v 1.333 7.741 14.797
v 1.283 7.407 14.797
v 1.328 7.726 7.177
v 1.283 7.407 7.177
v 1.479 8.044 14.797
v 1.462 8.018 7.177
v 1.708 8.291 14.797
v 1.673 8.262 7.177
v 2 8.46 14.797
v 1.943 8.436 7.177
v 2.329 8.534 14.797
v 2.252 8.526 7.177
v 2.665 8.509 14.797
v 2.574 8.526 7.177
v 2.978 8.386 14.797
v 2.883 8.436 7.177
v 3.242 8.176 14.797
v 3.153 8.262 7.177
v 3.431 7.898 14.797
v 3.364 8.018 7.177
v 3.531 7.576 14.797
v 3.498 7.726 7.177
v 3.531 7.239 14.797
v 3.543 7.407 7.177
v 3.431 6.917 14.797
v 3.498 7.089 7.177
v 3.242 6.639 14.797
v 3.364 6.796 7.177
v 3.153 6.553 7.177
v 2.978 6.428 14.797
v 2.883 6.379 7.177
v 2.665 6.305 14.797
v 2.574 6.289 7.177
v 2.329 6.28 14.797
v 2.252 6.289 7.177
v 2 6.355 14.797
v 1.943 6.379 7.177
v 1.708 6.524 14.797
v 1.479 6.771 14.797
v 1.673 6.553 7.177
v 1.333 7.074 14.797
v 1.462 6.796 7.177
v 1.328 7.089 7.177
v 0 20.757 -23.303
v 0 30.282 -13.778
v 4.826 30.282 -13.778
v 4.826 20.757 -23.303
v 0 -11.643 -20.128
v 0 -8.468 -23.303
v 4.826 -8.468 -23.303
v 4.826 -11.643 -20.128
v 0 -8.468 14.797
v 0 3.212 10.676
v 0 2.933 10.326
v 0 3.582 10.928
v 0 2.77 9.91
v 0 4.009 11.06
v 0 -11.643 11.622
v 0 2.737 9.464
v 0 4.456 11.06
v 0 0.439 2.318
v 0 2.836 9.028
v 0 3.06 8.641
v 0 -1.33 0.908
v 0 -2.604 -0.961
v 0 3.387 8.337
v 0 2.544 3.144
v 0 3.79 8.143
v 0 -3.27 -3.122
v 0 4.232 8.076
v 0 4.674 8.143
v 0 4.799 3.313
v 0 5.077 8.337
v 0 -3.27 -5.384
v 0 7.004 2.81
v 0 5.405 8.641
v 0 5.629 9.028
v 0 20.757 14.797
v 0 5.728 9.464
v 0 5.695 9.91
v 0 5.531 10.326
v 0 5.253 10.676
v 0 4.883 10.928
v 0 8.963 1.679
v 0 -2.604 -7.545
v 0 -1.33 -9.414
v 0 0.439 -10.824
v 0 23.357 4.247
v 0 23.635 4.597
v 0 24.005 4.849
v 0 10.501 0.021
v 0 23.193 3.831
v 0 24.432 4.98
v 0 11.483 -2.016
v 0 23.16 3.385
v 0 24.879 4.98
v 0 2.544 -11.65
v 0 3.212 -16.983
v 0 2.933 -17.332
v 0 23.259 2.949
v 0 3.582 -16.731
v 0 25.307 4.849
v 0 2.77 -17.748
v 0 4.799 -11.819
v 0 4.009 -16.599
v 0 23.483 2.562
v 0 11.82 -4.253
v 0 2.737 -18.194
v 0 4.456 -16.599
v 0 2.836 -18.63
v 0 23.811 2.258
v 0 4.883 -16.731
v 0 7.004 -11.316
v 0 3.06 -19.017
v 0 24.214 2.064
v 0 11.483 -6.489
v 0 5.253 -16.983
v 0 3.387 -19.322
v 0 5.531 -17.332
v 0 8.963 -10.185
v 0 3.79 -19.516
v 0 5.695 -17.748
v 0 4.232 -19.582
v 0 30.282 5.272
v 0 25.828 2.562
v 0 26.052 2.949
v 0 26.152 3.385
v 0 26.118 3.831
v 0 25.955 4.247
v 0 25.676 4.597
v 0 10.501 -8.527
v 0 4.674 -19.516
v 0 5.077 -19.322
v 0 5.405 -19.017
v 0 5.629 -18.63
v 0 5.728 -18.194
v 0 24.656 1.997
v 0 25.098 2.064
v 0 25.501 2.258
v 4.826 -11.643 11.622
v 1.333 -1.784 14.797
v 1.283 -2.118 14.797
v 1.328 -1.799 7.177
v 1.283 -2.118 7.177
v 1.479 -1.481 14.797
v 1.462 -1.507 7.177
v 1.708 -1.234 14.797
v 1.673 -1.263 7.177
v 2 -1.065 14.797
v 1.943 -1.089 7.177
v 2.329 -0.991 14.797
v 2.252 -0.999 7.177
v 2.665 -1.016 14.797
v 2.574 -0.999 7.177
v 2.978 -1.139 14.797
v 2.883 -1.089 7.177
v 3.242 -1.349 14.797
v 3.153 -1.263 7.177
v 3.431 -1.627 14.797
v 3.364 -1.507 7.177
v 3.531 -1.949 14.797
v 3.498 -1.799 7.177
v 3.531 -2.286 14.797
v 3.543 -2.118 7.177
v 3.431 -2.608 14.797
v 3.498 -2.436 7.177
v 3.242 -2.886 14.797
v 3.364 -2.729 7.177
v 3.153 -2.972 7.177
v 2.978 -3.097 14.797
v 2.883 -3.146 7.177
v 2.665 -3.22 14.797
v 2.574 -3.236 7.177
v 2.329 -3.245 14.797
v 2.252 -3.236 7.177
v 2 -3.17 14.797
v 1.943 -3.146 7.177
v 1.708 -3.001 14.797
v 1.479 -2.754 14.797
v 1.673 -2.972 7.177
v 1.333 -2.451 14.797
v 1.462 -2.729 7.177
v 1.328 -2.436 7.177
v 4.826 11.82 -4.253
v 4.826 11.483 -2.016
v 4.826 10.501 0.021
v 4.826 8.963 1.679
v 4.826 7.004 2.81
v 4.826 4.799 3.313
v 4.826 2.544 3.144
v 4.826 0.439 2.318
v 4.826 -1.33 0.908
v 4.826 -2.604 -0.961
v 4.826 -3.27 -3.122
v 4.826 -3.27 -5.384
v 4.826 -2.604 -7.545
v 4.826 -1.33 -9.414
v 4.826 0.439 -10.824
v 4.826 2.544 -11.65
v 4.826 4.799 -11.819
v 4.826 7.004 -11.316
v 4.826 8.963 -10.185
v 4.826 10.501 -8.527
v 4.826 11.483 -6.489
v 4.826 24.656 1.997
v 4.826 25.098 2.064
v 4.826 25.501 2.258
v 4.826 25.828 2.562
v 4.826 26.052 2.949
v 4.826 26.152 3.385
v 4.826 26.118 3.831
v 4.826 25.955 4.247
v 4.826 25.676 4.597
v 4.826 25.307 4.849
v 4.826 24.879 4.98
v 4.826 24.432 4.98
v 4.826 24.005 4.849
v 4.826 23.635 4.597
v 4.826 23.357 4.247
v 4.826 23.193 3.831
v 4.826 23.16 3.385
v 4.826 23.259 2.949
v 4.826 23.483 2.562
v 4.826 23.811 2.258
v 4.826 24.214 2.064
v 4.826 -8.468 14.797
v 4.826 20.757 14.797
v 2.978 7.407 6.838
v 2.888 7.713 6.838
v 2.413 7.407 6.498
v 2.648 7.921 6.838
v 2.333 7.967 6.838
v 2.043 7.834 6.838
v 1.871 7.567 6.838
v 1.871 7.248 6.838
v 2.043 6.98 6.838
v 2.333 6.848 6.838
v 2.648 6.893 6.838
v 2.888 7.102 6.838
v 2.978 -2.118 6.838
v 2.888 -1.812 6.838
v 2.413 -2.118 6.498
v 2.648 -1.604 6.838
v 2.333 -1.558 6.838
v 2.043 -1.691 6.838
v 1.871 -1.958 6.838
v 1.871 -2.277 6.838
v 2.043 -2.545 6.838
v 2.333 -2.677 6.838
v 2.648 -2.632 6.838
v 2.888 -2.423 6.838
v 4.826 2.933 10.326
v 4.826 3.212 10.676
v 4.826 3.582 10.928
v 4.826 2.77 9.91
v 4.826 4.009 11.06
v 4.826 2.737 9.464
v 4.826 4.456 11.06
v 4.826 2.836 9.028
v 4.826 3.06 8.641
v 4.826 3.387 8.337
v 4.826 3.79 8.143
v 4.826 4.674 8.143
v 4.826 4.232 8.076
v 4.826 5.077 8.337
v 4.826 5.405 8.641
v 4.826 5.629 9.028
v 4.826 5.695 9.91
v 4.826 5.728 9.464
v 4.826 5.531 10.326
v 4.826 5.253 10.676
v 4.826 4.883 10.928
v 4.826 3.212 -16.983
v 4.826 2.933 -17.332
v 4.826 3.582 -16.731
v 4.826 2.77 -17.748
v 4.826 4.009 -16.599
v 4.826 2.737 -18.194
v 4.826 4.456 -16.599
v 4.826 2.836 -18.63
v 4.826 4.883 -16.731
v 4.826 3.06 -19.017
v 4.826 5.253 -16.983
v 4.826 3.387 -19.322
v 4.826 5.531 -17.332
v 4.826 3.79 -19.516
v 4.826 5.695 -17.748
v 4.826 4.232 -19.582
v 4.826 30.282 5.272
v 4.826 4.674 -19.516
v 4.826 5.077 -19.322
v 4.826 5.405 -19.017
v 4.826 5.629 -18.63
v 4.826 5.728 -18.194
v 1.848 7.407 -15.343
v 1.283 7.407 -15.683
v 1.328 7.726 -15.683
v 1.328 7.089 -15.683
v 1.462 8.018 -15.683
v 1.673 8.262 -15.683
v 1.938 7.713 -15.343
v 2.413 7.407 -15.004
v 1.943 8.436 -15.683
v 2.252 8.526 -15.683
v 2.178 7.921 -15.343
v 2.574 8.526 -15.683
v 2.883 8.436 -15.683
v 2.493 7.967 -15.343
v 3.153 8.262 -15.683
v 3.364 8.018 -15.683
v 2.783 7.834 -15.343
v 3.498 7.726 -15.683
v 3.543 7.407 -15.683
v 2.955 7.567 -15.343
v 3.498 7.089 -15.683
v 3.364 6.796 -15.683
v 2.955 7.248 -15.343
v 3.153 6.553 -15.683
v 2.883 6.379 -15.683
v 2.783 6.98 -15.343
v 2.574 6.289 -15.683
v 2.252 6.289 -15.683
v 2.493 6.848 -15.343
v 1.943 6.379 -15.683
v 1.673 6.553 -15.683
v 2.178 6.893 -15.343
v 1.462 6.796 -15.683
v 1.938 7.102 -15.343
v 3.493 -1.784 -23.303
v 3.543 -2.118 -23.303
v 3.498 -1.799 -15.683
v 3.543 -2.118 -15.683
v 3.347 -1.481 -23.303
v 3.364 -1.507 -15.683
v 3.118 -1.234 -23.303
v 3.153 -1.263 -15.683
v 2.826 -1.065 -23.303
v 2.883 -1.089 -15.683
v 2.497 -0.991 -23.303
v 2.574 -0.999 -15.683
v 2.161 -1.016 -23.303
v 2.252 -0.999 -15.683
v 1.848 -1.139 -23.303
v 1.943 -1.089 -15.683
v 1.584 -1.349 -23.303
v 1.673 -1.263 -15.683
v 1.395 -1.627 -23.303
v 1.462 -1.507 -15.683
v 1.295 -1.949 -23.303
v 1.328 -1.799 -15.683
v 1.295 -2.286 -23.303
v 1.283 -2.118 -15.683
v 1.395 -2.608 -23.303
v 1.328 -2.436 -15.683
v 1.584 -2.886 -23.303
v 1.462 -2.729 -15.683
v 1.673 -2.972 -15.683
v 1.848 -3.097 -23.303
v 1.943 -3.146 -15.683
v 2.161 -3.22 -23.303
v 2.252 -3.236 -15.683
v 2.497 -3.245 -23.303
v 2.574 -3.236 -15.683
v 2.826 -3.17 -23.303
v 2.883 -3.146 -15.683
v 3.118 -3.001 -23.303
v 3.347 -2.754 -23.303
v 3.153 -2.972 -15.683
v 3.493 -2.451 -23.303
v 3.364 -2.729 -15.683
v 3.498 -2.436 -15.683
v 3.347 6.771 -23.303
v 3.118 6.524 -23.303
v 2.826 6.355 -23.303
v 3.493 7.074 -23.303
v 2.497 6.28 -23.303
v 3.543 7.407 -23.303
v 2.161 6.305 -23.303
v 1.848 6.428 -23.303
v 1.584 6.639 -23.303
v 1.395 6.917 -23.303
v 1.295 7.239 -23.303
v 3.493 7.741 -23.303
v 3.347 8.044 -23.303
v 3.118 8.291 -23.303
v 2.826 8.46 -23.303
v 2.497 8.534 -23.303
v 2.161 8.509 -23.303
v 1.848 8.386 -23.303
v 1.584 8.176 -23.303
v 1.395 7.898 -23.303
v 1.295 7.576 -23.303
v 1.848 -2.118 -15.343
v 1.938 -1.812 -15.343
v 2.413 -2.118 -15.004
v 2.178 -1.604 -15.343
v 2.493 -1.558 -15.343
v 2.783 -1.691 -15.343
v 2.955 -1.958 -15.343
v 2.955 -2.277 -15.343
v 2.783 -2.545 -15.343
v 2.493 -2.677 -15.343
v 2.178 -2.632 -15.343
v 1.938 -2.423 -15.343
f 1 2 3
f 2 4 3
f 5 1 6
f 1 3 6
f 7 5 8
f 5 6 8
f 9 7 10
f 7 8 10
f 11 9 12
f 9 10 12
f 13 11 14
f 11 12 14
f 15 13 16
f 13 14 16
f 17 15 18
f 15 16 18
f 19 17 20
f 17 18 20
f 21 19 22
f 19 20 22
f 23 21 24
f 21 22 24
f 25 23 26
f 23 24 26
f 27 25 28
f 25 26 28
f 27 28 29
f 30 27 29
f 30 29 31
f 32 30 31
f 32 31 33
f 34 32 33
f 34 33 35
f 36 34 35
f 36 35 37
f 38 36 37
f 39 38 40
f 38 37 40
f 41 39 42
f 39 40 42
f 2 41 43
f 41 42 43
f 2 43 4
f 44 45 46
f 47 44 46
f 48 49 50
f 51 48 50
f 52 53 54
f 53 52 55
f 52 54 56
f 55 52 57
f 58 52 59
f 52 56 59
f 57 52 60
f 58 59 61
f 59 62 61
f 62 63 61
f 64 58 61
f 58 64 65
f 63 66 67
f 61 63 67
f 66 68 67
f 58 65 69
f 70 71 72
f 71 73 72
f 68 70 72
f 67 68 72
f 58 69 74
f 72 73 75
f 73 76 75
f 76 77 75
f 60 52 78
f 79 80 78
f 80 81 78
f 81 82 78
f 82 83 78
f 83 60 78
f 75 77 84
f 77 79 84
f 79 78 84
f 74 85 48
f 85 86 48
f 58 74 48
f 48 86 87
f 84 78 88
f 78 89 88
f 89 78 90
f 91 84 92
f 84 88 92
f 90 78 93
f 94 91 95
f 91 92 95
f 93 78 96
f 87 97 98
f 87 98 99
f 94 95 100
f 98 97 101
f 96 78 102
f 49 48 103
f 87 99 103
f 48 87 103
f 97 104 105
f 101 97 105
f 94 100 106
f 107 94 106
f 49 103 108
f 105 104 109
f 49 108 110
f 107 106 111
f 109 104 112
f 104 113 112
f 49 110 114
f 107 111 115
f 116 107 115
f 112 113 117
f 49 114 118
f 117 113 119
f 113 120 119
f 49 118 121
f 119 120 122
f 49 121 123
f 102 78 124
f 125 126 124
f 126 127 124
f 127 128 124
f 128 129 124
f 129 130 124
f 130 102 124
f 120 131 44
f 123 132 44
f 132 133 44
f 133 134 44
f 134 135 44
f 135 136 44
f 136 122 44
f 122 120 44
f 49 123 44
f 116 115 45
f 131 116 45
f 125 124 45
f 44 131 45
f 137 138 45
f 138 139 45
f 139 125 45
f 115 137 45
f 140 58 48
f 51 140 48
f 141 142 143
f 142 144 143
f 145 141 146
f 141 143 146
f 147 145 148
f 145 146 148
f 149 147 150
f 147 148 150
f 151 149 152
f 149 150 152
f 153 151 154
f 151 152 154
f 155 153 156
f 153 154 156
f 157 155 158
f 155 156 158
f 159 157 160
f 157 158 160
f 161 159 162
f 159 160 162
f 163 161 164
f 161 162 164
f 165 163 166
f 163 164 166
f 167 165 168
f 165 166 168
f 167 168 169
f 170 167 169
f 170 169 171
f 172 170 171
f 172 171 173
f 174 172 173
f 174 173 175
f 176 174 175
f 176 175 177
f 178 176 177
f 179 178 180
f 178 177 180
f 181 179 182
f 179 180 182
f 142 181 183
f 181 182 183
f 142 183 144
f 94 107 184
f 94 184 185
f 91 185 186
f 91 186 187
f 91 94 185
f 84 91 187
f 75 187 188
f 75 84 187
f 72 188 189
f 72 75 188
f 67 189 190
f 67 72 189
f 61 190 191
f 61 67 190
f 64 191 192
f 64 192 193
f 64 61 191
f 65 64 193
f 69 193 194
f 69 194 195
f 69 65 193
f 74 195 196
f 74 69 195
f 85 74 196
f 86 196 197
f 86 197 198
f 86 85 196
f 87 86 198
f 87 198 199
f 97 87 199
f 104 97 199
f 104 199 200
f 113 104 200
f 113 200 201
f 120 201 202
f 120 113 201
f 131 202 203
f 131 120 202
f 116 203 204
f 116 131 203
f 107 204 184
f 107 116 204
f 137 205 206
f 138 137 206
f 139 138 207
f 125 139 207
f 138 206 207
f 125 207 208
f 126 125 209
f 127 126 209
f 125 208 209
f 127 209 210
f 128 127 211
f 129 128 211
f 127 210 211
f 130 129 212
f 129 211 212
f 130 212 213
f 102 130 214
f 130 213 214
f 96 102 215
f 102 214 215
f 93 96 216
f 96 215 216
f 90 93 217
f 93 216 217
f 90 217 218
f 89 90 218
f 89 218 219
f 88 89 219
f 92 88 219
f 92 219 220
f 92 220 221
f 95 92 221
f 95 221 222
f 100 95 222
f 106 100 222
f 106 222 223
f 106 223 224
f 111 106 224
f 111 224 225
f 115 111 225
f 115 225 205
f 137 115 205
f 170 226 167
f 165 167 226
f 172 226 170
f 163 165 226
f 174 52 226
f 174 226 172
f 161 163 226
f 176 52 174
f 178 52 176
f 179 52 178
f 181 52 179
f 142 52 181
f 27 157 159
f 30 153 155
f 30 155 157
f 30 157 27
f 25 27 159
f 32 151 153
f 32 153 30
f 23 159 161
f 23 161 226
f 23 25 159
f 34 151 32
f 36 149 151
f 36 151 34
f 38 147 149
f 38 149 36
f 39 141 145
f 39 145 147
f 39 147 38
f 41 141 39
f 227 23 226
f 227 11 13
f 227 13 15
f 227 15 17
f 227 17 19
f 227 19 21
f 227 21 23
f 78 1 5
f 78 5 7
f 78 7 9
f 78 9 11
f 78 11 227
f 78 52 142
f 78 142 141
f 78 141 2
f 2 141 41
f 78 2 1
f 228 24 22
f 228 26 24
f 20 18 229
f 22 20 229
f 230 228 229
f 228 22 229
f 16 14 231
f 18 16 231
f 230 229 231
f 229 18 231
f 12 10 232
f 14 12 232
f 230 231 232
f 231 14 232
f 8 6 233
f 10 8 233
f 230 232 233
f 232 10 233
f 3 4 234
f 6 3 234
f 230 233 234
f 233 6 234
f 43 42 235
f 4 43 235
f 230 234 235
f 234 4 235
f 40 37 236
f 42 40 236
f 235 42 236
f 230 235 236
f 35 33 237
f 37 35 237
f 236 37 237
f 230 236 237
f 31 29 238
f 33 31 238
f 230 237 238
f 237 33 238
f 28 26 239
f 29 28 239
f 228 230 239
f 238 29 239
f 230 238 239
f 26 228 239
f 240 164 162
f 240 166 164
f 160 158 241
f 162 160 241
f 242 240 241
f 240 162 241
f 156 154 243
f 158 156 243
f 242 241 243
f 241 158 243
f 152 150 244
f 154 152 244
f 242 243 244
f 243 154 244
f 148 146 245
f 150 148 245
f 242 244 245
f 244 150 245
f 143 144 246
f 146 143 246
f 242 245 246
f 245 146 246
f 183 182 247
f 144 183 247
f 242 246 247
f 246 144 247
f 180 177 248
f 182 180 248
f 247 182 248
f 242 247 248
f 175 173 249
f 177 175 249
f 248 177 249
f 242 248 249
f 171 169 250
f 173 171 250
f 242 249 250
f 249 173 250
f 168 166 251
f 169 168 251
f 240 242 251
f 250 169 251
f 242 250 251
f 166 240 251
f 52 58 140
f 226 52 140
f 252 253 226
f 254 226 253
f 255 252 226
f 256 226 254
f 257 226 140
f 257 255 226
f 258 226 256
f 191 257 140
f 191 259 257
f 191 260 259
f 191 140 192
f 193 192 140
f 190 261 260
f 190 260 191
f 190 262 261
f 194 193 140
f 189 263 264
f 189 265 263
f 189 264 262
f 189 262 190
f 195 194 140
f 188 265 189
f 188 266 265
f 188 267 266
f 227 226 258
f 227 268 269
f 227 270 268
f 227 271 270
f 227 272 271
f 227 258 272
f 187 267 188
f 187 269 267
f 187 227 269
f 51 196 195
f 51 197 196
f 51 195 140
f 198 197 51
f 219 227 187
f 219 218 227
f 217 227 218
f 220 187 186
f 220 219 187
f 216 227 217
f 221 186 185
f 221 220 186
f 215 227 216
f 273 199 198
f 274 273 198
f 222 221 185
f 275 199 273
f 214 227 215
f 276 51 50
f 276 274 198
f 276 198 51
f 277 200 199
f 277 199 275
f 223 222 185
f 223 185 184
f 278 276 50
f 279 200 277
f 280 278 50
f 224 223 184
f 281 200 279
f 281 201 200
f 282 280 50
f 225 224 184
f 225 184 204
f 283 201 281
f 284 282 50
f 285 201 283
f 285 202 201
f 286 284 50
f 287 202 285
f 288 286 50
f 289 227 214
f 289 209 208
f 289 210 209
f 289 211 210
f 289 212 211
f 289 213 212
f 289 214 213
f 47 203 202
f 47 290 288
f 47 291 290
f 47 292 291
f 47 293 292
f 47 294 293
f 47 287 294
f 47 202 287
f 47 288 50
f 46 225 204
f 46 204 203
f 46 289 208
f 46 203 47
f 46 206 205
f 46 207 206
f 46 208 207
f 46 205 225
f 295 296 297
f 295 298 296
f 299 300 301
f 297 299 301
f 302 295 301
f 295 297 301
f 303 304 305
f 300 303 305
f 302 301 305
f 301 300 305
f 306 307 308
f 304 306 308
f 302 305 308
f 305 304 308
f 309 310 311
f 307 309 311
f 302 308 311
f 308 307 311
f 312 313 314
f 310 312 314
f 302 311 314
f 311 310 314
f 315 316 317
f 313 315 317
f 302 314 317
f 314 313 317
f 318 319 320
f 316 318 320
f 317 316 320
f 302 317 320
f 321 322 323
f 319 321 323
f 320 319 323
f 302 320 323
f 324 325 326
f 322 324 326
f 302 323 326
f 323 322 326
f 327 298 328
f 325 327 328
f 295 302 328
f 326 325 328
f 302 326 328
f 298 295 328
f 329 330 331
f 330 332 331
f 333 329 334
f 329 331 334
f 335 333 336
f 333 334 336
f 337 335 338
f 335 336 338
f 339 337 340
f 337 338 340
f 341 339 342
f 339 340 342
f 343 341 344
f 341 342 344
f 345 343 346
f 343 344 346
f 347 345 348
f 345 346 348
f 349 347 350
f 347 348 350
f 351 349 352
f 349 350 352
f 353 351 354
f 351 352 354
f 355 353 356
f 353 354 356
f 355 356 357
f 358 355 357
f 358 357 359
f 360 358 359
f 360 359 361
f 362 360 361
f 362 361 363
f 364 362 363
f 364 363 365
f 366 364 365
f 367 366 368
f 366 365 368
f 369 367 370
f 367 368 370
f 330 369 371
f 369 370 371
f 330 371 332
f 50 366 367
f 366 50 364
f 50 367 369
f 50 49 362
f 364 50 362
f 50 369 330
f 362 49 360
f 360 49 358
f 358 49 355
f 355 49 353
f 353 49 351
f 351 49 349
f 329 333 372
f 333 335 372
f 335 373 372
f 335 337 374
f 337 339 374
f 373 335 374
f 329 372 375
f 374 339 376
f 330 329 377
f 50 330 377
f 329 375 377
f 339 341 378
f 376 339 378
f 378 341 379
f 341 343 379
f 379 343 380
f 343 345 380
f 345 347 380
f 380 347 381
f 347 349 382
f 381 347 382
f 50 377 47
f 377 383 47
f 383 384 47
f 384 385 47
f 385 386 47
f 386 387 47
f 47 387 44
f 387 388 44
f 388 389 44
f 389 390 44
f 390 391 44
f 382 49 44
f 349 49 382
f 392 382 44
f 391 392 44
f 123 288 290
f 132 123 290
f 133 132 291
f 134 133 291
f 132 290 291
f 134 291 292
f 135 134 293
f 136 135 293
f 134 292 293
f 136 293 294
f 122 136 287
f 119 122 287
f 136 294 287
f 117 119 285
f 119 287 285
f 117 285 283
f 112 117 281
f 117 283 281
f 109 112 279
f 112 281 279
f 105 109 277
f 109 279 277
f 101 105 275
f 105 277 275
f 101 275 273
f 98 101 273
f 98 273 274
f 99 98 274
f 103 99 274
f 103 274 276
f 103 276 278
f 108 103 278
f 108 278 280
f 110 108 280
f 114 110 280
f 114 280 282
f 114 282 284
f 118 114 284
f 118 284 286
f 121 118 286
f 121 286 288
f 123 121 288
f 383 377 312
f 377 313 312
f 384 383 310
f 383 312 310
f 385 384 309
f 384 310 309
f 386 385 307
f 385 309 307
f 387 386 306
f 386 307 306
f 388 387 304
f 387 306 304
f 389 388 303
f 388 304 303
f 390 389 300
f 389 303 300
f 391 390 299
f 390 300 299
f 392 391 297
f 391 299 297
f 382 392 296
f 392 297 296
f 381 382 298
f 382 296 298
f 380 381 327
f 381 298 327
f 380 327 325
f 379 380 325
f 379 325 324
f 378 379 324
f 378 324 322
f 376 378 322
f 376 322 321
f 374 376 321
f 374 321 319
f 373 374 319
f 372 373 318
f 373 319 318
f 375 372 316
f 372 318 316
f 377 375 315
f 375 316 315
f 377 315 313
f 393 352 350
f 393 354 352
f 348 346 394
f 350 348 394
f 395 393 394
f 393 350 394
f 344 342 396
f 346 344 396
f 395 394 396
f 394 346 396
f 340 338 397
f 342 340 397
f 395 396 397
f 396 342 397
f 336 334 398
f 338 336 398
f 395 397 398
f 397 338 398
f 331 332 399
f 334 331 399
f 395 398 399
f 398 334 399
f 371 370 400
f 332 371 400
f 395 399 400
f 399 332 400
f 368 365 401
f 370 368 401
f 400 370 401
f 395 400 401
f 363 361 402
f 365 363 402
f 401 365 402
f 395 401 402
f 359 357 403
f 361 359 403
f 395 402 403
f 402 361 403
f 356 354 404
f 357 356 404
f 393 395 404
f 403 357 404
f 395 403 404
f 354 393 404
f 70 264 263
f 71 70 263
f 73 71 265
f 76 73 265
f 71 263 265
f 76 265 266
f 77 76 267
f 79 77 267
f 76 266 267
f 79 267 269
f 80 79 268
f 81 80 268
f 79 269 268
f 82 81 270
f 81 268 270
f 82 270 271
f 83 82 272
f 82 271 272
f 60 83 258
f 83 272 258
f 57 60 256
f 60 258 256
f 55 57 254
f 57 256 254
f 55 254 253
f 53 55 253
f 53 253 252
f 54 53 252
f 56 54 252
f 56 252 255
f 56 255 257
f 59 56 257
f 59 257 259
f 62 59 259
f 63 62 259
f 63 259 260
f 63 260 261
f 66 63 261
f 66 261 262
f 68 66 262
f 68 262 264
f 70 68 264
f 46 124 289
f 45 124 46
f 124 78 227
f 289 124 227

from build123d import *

# Parameters (mm, degrees)
SKETCH1_W                 = 38.1
SKETCH1_H                 = 41.925
SKETCH1_R                 = 7.5875
BOSS_EXTRUDE1_DEPTH       = 4.826
F_3_0_3_DIAMETER_HOLE1_D  = 3
CHAMFER1_SIZE             = 9.525
CHAMFER2_SIZE             = 3.175
F_4_40_TAPPED_HOLE1_D     = 2.2606
F_4_40_TAPPED_HOLE1_DEPTH = 7.62
F_4_40_TAPPED_HOLE1_TIP   = 0.679152758
F_4_40_TAPPED_HOLE2_D     = 2.2606
F_4_40_TAPPED_HOLE2_DEPTH = 7.62
F_4_40_TAPPED_HOLE2_TIP   = 0.679152758


with BuildPart() as part:
    # Sketch1 → Boss-Extrude1 (new body)
    with BuildSketch(Plane(origin=(0, 0, 0), x_dir=(0, 0, -1), z_dir=(1, 0, 0))):
        with Locations((4.25291004, 9.319846416)):
            Rectangle(SKETCH1_W, SKETCH1_H)
        with Locations(Location((4.25291004, 4.232346416, 0), (0, 0, 90))):
            Circle(SKETCH1_R, mode=Mode.SUBTRACT)
    extrude(amount=BOSS_EXTRUDE1_DEPTH)

    # Ø3.0 (3) Diameter Hole1 (through all)
    with Locations(Plane.ZY):
        with Locations((3.49708996, 24.655740175), (9.576406646, 4.232346416), (-18.082226726, 4.232346416)):
            Hole(F_3_0_3_DIAMETER_HOLE1_D / 2)

    # Chamfer1
    chamfer1_edges = [part.edges().sort_by_distance(p)[0] for p in [
        (2.413, 30.282346416, 14.79708996),
        (2.413, 30.282346416, -23.30291004),
    ]]
    chamfer(chamfer1_edges, length=CHAMFER1_SIZE)

    # Chamfer2
    chamfer2_edges = [part.edges().sort_by_distance(p)[0] for p in [
        (2.413, -11.642653584, -23.30291004),
        (2.413, -11.642653584, 14.79708996),
    ]]
    chamfer(chamfer2_edges, length=CHAMFER2_SIZE)

    # #4-40 Tapped Hole1
    with Locations(Plane(origin=(-40.959349893, -24.044697485, -23.30291004), x_dir=(-1, 0, 0), z_dir=(0, 0, -1))):
        with Locations((-43.372349893, 31.452043901), (-43.372349893, 21.927043901)):
            Hole(F_4_40_TAPPED_HOLE1_D / 2, depth=F_4_40_TAPPED_HOLE1_DEPTH)
            with Locations((0, 0, -(F_4_40_TAPPED_HOLE1_DEPTH + F_4_40_TAPPED_HOLE1_TIP / 2))):  # 118° drill point
                Cone(0, F_4_40_TAPPED_HOLE1_D / 2, F_4_40_TAPPED_HOLE1_TIP, mode=Mode.SUBTRACT)

    # #4-40 Tapped Hole2
    with Locations(Plane(origin=(-40.959349893, -24.044697485, 14.79708996), x_dir=(1, 0, 0), z_dir=(0, 0, 1))):
        with Locations((43.372349893, 21.927043901), (43.372349893, 31.452043901)):
            Hole(F_4_40_TAPPED_HOLE2_D / 2, depth=F_4_40_TAPPED_HOLE2_DEPTH)
            with Locations((0, 0, -(F_4_40_TAPPED_HOLE2_DEPTH + F_4_40_TAPPED_HOLE2_TIP / 2))):  # 118° drill point
                Cone(0, F_4_40_TAPPED_HOLE2_D / 2, F_4_40_TAPPED_HOLE2_TIP, mode=Mode.SUBTRACT)


solid = part.part
